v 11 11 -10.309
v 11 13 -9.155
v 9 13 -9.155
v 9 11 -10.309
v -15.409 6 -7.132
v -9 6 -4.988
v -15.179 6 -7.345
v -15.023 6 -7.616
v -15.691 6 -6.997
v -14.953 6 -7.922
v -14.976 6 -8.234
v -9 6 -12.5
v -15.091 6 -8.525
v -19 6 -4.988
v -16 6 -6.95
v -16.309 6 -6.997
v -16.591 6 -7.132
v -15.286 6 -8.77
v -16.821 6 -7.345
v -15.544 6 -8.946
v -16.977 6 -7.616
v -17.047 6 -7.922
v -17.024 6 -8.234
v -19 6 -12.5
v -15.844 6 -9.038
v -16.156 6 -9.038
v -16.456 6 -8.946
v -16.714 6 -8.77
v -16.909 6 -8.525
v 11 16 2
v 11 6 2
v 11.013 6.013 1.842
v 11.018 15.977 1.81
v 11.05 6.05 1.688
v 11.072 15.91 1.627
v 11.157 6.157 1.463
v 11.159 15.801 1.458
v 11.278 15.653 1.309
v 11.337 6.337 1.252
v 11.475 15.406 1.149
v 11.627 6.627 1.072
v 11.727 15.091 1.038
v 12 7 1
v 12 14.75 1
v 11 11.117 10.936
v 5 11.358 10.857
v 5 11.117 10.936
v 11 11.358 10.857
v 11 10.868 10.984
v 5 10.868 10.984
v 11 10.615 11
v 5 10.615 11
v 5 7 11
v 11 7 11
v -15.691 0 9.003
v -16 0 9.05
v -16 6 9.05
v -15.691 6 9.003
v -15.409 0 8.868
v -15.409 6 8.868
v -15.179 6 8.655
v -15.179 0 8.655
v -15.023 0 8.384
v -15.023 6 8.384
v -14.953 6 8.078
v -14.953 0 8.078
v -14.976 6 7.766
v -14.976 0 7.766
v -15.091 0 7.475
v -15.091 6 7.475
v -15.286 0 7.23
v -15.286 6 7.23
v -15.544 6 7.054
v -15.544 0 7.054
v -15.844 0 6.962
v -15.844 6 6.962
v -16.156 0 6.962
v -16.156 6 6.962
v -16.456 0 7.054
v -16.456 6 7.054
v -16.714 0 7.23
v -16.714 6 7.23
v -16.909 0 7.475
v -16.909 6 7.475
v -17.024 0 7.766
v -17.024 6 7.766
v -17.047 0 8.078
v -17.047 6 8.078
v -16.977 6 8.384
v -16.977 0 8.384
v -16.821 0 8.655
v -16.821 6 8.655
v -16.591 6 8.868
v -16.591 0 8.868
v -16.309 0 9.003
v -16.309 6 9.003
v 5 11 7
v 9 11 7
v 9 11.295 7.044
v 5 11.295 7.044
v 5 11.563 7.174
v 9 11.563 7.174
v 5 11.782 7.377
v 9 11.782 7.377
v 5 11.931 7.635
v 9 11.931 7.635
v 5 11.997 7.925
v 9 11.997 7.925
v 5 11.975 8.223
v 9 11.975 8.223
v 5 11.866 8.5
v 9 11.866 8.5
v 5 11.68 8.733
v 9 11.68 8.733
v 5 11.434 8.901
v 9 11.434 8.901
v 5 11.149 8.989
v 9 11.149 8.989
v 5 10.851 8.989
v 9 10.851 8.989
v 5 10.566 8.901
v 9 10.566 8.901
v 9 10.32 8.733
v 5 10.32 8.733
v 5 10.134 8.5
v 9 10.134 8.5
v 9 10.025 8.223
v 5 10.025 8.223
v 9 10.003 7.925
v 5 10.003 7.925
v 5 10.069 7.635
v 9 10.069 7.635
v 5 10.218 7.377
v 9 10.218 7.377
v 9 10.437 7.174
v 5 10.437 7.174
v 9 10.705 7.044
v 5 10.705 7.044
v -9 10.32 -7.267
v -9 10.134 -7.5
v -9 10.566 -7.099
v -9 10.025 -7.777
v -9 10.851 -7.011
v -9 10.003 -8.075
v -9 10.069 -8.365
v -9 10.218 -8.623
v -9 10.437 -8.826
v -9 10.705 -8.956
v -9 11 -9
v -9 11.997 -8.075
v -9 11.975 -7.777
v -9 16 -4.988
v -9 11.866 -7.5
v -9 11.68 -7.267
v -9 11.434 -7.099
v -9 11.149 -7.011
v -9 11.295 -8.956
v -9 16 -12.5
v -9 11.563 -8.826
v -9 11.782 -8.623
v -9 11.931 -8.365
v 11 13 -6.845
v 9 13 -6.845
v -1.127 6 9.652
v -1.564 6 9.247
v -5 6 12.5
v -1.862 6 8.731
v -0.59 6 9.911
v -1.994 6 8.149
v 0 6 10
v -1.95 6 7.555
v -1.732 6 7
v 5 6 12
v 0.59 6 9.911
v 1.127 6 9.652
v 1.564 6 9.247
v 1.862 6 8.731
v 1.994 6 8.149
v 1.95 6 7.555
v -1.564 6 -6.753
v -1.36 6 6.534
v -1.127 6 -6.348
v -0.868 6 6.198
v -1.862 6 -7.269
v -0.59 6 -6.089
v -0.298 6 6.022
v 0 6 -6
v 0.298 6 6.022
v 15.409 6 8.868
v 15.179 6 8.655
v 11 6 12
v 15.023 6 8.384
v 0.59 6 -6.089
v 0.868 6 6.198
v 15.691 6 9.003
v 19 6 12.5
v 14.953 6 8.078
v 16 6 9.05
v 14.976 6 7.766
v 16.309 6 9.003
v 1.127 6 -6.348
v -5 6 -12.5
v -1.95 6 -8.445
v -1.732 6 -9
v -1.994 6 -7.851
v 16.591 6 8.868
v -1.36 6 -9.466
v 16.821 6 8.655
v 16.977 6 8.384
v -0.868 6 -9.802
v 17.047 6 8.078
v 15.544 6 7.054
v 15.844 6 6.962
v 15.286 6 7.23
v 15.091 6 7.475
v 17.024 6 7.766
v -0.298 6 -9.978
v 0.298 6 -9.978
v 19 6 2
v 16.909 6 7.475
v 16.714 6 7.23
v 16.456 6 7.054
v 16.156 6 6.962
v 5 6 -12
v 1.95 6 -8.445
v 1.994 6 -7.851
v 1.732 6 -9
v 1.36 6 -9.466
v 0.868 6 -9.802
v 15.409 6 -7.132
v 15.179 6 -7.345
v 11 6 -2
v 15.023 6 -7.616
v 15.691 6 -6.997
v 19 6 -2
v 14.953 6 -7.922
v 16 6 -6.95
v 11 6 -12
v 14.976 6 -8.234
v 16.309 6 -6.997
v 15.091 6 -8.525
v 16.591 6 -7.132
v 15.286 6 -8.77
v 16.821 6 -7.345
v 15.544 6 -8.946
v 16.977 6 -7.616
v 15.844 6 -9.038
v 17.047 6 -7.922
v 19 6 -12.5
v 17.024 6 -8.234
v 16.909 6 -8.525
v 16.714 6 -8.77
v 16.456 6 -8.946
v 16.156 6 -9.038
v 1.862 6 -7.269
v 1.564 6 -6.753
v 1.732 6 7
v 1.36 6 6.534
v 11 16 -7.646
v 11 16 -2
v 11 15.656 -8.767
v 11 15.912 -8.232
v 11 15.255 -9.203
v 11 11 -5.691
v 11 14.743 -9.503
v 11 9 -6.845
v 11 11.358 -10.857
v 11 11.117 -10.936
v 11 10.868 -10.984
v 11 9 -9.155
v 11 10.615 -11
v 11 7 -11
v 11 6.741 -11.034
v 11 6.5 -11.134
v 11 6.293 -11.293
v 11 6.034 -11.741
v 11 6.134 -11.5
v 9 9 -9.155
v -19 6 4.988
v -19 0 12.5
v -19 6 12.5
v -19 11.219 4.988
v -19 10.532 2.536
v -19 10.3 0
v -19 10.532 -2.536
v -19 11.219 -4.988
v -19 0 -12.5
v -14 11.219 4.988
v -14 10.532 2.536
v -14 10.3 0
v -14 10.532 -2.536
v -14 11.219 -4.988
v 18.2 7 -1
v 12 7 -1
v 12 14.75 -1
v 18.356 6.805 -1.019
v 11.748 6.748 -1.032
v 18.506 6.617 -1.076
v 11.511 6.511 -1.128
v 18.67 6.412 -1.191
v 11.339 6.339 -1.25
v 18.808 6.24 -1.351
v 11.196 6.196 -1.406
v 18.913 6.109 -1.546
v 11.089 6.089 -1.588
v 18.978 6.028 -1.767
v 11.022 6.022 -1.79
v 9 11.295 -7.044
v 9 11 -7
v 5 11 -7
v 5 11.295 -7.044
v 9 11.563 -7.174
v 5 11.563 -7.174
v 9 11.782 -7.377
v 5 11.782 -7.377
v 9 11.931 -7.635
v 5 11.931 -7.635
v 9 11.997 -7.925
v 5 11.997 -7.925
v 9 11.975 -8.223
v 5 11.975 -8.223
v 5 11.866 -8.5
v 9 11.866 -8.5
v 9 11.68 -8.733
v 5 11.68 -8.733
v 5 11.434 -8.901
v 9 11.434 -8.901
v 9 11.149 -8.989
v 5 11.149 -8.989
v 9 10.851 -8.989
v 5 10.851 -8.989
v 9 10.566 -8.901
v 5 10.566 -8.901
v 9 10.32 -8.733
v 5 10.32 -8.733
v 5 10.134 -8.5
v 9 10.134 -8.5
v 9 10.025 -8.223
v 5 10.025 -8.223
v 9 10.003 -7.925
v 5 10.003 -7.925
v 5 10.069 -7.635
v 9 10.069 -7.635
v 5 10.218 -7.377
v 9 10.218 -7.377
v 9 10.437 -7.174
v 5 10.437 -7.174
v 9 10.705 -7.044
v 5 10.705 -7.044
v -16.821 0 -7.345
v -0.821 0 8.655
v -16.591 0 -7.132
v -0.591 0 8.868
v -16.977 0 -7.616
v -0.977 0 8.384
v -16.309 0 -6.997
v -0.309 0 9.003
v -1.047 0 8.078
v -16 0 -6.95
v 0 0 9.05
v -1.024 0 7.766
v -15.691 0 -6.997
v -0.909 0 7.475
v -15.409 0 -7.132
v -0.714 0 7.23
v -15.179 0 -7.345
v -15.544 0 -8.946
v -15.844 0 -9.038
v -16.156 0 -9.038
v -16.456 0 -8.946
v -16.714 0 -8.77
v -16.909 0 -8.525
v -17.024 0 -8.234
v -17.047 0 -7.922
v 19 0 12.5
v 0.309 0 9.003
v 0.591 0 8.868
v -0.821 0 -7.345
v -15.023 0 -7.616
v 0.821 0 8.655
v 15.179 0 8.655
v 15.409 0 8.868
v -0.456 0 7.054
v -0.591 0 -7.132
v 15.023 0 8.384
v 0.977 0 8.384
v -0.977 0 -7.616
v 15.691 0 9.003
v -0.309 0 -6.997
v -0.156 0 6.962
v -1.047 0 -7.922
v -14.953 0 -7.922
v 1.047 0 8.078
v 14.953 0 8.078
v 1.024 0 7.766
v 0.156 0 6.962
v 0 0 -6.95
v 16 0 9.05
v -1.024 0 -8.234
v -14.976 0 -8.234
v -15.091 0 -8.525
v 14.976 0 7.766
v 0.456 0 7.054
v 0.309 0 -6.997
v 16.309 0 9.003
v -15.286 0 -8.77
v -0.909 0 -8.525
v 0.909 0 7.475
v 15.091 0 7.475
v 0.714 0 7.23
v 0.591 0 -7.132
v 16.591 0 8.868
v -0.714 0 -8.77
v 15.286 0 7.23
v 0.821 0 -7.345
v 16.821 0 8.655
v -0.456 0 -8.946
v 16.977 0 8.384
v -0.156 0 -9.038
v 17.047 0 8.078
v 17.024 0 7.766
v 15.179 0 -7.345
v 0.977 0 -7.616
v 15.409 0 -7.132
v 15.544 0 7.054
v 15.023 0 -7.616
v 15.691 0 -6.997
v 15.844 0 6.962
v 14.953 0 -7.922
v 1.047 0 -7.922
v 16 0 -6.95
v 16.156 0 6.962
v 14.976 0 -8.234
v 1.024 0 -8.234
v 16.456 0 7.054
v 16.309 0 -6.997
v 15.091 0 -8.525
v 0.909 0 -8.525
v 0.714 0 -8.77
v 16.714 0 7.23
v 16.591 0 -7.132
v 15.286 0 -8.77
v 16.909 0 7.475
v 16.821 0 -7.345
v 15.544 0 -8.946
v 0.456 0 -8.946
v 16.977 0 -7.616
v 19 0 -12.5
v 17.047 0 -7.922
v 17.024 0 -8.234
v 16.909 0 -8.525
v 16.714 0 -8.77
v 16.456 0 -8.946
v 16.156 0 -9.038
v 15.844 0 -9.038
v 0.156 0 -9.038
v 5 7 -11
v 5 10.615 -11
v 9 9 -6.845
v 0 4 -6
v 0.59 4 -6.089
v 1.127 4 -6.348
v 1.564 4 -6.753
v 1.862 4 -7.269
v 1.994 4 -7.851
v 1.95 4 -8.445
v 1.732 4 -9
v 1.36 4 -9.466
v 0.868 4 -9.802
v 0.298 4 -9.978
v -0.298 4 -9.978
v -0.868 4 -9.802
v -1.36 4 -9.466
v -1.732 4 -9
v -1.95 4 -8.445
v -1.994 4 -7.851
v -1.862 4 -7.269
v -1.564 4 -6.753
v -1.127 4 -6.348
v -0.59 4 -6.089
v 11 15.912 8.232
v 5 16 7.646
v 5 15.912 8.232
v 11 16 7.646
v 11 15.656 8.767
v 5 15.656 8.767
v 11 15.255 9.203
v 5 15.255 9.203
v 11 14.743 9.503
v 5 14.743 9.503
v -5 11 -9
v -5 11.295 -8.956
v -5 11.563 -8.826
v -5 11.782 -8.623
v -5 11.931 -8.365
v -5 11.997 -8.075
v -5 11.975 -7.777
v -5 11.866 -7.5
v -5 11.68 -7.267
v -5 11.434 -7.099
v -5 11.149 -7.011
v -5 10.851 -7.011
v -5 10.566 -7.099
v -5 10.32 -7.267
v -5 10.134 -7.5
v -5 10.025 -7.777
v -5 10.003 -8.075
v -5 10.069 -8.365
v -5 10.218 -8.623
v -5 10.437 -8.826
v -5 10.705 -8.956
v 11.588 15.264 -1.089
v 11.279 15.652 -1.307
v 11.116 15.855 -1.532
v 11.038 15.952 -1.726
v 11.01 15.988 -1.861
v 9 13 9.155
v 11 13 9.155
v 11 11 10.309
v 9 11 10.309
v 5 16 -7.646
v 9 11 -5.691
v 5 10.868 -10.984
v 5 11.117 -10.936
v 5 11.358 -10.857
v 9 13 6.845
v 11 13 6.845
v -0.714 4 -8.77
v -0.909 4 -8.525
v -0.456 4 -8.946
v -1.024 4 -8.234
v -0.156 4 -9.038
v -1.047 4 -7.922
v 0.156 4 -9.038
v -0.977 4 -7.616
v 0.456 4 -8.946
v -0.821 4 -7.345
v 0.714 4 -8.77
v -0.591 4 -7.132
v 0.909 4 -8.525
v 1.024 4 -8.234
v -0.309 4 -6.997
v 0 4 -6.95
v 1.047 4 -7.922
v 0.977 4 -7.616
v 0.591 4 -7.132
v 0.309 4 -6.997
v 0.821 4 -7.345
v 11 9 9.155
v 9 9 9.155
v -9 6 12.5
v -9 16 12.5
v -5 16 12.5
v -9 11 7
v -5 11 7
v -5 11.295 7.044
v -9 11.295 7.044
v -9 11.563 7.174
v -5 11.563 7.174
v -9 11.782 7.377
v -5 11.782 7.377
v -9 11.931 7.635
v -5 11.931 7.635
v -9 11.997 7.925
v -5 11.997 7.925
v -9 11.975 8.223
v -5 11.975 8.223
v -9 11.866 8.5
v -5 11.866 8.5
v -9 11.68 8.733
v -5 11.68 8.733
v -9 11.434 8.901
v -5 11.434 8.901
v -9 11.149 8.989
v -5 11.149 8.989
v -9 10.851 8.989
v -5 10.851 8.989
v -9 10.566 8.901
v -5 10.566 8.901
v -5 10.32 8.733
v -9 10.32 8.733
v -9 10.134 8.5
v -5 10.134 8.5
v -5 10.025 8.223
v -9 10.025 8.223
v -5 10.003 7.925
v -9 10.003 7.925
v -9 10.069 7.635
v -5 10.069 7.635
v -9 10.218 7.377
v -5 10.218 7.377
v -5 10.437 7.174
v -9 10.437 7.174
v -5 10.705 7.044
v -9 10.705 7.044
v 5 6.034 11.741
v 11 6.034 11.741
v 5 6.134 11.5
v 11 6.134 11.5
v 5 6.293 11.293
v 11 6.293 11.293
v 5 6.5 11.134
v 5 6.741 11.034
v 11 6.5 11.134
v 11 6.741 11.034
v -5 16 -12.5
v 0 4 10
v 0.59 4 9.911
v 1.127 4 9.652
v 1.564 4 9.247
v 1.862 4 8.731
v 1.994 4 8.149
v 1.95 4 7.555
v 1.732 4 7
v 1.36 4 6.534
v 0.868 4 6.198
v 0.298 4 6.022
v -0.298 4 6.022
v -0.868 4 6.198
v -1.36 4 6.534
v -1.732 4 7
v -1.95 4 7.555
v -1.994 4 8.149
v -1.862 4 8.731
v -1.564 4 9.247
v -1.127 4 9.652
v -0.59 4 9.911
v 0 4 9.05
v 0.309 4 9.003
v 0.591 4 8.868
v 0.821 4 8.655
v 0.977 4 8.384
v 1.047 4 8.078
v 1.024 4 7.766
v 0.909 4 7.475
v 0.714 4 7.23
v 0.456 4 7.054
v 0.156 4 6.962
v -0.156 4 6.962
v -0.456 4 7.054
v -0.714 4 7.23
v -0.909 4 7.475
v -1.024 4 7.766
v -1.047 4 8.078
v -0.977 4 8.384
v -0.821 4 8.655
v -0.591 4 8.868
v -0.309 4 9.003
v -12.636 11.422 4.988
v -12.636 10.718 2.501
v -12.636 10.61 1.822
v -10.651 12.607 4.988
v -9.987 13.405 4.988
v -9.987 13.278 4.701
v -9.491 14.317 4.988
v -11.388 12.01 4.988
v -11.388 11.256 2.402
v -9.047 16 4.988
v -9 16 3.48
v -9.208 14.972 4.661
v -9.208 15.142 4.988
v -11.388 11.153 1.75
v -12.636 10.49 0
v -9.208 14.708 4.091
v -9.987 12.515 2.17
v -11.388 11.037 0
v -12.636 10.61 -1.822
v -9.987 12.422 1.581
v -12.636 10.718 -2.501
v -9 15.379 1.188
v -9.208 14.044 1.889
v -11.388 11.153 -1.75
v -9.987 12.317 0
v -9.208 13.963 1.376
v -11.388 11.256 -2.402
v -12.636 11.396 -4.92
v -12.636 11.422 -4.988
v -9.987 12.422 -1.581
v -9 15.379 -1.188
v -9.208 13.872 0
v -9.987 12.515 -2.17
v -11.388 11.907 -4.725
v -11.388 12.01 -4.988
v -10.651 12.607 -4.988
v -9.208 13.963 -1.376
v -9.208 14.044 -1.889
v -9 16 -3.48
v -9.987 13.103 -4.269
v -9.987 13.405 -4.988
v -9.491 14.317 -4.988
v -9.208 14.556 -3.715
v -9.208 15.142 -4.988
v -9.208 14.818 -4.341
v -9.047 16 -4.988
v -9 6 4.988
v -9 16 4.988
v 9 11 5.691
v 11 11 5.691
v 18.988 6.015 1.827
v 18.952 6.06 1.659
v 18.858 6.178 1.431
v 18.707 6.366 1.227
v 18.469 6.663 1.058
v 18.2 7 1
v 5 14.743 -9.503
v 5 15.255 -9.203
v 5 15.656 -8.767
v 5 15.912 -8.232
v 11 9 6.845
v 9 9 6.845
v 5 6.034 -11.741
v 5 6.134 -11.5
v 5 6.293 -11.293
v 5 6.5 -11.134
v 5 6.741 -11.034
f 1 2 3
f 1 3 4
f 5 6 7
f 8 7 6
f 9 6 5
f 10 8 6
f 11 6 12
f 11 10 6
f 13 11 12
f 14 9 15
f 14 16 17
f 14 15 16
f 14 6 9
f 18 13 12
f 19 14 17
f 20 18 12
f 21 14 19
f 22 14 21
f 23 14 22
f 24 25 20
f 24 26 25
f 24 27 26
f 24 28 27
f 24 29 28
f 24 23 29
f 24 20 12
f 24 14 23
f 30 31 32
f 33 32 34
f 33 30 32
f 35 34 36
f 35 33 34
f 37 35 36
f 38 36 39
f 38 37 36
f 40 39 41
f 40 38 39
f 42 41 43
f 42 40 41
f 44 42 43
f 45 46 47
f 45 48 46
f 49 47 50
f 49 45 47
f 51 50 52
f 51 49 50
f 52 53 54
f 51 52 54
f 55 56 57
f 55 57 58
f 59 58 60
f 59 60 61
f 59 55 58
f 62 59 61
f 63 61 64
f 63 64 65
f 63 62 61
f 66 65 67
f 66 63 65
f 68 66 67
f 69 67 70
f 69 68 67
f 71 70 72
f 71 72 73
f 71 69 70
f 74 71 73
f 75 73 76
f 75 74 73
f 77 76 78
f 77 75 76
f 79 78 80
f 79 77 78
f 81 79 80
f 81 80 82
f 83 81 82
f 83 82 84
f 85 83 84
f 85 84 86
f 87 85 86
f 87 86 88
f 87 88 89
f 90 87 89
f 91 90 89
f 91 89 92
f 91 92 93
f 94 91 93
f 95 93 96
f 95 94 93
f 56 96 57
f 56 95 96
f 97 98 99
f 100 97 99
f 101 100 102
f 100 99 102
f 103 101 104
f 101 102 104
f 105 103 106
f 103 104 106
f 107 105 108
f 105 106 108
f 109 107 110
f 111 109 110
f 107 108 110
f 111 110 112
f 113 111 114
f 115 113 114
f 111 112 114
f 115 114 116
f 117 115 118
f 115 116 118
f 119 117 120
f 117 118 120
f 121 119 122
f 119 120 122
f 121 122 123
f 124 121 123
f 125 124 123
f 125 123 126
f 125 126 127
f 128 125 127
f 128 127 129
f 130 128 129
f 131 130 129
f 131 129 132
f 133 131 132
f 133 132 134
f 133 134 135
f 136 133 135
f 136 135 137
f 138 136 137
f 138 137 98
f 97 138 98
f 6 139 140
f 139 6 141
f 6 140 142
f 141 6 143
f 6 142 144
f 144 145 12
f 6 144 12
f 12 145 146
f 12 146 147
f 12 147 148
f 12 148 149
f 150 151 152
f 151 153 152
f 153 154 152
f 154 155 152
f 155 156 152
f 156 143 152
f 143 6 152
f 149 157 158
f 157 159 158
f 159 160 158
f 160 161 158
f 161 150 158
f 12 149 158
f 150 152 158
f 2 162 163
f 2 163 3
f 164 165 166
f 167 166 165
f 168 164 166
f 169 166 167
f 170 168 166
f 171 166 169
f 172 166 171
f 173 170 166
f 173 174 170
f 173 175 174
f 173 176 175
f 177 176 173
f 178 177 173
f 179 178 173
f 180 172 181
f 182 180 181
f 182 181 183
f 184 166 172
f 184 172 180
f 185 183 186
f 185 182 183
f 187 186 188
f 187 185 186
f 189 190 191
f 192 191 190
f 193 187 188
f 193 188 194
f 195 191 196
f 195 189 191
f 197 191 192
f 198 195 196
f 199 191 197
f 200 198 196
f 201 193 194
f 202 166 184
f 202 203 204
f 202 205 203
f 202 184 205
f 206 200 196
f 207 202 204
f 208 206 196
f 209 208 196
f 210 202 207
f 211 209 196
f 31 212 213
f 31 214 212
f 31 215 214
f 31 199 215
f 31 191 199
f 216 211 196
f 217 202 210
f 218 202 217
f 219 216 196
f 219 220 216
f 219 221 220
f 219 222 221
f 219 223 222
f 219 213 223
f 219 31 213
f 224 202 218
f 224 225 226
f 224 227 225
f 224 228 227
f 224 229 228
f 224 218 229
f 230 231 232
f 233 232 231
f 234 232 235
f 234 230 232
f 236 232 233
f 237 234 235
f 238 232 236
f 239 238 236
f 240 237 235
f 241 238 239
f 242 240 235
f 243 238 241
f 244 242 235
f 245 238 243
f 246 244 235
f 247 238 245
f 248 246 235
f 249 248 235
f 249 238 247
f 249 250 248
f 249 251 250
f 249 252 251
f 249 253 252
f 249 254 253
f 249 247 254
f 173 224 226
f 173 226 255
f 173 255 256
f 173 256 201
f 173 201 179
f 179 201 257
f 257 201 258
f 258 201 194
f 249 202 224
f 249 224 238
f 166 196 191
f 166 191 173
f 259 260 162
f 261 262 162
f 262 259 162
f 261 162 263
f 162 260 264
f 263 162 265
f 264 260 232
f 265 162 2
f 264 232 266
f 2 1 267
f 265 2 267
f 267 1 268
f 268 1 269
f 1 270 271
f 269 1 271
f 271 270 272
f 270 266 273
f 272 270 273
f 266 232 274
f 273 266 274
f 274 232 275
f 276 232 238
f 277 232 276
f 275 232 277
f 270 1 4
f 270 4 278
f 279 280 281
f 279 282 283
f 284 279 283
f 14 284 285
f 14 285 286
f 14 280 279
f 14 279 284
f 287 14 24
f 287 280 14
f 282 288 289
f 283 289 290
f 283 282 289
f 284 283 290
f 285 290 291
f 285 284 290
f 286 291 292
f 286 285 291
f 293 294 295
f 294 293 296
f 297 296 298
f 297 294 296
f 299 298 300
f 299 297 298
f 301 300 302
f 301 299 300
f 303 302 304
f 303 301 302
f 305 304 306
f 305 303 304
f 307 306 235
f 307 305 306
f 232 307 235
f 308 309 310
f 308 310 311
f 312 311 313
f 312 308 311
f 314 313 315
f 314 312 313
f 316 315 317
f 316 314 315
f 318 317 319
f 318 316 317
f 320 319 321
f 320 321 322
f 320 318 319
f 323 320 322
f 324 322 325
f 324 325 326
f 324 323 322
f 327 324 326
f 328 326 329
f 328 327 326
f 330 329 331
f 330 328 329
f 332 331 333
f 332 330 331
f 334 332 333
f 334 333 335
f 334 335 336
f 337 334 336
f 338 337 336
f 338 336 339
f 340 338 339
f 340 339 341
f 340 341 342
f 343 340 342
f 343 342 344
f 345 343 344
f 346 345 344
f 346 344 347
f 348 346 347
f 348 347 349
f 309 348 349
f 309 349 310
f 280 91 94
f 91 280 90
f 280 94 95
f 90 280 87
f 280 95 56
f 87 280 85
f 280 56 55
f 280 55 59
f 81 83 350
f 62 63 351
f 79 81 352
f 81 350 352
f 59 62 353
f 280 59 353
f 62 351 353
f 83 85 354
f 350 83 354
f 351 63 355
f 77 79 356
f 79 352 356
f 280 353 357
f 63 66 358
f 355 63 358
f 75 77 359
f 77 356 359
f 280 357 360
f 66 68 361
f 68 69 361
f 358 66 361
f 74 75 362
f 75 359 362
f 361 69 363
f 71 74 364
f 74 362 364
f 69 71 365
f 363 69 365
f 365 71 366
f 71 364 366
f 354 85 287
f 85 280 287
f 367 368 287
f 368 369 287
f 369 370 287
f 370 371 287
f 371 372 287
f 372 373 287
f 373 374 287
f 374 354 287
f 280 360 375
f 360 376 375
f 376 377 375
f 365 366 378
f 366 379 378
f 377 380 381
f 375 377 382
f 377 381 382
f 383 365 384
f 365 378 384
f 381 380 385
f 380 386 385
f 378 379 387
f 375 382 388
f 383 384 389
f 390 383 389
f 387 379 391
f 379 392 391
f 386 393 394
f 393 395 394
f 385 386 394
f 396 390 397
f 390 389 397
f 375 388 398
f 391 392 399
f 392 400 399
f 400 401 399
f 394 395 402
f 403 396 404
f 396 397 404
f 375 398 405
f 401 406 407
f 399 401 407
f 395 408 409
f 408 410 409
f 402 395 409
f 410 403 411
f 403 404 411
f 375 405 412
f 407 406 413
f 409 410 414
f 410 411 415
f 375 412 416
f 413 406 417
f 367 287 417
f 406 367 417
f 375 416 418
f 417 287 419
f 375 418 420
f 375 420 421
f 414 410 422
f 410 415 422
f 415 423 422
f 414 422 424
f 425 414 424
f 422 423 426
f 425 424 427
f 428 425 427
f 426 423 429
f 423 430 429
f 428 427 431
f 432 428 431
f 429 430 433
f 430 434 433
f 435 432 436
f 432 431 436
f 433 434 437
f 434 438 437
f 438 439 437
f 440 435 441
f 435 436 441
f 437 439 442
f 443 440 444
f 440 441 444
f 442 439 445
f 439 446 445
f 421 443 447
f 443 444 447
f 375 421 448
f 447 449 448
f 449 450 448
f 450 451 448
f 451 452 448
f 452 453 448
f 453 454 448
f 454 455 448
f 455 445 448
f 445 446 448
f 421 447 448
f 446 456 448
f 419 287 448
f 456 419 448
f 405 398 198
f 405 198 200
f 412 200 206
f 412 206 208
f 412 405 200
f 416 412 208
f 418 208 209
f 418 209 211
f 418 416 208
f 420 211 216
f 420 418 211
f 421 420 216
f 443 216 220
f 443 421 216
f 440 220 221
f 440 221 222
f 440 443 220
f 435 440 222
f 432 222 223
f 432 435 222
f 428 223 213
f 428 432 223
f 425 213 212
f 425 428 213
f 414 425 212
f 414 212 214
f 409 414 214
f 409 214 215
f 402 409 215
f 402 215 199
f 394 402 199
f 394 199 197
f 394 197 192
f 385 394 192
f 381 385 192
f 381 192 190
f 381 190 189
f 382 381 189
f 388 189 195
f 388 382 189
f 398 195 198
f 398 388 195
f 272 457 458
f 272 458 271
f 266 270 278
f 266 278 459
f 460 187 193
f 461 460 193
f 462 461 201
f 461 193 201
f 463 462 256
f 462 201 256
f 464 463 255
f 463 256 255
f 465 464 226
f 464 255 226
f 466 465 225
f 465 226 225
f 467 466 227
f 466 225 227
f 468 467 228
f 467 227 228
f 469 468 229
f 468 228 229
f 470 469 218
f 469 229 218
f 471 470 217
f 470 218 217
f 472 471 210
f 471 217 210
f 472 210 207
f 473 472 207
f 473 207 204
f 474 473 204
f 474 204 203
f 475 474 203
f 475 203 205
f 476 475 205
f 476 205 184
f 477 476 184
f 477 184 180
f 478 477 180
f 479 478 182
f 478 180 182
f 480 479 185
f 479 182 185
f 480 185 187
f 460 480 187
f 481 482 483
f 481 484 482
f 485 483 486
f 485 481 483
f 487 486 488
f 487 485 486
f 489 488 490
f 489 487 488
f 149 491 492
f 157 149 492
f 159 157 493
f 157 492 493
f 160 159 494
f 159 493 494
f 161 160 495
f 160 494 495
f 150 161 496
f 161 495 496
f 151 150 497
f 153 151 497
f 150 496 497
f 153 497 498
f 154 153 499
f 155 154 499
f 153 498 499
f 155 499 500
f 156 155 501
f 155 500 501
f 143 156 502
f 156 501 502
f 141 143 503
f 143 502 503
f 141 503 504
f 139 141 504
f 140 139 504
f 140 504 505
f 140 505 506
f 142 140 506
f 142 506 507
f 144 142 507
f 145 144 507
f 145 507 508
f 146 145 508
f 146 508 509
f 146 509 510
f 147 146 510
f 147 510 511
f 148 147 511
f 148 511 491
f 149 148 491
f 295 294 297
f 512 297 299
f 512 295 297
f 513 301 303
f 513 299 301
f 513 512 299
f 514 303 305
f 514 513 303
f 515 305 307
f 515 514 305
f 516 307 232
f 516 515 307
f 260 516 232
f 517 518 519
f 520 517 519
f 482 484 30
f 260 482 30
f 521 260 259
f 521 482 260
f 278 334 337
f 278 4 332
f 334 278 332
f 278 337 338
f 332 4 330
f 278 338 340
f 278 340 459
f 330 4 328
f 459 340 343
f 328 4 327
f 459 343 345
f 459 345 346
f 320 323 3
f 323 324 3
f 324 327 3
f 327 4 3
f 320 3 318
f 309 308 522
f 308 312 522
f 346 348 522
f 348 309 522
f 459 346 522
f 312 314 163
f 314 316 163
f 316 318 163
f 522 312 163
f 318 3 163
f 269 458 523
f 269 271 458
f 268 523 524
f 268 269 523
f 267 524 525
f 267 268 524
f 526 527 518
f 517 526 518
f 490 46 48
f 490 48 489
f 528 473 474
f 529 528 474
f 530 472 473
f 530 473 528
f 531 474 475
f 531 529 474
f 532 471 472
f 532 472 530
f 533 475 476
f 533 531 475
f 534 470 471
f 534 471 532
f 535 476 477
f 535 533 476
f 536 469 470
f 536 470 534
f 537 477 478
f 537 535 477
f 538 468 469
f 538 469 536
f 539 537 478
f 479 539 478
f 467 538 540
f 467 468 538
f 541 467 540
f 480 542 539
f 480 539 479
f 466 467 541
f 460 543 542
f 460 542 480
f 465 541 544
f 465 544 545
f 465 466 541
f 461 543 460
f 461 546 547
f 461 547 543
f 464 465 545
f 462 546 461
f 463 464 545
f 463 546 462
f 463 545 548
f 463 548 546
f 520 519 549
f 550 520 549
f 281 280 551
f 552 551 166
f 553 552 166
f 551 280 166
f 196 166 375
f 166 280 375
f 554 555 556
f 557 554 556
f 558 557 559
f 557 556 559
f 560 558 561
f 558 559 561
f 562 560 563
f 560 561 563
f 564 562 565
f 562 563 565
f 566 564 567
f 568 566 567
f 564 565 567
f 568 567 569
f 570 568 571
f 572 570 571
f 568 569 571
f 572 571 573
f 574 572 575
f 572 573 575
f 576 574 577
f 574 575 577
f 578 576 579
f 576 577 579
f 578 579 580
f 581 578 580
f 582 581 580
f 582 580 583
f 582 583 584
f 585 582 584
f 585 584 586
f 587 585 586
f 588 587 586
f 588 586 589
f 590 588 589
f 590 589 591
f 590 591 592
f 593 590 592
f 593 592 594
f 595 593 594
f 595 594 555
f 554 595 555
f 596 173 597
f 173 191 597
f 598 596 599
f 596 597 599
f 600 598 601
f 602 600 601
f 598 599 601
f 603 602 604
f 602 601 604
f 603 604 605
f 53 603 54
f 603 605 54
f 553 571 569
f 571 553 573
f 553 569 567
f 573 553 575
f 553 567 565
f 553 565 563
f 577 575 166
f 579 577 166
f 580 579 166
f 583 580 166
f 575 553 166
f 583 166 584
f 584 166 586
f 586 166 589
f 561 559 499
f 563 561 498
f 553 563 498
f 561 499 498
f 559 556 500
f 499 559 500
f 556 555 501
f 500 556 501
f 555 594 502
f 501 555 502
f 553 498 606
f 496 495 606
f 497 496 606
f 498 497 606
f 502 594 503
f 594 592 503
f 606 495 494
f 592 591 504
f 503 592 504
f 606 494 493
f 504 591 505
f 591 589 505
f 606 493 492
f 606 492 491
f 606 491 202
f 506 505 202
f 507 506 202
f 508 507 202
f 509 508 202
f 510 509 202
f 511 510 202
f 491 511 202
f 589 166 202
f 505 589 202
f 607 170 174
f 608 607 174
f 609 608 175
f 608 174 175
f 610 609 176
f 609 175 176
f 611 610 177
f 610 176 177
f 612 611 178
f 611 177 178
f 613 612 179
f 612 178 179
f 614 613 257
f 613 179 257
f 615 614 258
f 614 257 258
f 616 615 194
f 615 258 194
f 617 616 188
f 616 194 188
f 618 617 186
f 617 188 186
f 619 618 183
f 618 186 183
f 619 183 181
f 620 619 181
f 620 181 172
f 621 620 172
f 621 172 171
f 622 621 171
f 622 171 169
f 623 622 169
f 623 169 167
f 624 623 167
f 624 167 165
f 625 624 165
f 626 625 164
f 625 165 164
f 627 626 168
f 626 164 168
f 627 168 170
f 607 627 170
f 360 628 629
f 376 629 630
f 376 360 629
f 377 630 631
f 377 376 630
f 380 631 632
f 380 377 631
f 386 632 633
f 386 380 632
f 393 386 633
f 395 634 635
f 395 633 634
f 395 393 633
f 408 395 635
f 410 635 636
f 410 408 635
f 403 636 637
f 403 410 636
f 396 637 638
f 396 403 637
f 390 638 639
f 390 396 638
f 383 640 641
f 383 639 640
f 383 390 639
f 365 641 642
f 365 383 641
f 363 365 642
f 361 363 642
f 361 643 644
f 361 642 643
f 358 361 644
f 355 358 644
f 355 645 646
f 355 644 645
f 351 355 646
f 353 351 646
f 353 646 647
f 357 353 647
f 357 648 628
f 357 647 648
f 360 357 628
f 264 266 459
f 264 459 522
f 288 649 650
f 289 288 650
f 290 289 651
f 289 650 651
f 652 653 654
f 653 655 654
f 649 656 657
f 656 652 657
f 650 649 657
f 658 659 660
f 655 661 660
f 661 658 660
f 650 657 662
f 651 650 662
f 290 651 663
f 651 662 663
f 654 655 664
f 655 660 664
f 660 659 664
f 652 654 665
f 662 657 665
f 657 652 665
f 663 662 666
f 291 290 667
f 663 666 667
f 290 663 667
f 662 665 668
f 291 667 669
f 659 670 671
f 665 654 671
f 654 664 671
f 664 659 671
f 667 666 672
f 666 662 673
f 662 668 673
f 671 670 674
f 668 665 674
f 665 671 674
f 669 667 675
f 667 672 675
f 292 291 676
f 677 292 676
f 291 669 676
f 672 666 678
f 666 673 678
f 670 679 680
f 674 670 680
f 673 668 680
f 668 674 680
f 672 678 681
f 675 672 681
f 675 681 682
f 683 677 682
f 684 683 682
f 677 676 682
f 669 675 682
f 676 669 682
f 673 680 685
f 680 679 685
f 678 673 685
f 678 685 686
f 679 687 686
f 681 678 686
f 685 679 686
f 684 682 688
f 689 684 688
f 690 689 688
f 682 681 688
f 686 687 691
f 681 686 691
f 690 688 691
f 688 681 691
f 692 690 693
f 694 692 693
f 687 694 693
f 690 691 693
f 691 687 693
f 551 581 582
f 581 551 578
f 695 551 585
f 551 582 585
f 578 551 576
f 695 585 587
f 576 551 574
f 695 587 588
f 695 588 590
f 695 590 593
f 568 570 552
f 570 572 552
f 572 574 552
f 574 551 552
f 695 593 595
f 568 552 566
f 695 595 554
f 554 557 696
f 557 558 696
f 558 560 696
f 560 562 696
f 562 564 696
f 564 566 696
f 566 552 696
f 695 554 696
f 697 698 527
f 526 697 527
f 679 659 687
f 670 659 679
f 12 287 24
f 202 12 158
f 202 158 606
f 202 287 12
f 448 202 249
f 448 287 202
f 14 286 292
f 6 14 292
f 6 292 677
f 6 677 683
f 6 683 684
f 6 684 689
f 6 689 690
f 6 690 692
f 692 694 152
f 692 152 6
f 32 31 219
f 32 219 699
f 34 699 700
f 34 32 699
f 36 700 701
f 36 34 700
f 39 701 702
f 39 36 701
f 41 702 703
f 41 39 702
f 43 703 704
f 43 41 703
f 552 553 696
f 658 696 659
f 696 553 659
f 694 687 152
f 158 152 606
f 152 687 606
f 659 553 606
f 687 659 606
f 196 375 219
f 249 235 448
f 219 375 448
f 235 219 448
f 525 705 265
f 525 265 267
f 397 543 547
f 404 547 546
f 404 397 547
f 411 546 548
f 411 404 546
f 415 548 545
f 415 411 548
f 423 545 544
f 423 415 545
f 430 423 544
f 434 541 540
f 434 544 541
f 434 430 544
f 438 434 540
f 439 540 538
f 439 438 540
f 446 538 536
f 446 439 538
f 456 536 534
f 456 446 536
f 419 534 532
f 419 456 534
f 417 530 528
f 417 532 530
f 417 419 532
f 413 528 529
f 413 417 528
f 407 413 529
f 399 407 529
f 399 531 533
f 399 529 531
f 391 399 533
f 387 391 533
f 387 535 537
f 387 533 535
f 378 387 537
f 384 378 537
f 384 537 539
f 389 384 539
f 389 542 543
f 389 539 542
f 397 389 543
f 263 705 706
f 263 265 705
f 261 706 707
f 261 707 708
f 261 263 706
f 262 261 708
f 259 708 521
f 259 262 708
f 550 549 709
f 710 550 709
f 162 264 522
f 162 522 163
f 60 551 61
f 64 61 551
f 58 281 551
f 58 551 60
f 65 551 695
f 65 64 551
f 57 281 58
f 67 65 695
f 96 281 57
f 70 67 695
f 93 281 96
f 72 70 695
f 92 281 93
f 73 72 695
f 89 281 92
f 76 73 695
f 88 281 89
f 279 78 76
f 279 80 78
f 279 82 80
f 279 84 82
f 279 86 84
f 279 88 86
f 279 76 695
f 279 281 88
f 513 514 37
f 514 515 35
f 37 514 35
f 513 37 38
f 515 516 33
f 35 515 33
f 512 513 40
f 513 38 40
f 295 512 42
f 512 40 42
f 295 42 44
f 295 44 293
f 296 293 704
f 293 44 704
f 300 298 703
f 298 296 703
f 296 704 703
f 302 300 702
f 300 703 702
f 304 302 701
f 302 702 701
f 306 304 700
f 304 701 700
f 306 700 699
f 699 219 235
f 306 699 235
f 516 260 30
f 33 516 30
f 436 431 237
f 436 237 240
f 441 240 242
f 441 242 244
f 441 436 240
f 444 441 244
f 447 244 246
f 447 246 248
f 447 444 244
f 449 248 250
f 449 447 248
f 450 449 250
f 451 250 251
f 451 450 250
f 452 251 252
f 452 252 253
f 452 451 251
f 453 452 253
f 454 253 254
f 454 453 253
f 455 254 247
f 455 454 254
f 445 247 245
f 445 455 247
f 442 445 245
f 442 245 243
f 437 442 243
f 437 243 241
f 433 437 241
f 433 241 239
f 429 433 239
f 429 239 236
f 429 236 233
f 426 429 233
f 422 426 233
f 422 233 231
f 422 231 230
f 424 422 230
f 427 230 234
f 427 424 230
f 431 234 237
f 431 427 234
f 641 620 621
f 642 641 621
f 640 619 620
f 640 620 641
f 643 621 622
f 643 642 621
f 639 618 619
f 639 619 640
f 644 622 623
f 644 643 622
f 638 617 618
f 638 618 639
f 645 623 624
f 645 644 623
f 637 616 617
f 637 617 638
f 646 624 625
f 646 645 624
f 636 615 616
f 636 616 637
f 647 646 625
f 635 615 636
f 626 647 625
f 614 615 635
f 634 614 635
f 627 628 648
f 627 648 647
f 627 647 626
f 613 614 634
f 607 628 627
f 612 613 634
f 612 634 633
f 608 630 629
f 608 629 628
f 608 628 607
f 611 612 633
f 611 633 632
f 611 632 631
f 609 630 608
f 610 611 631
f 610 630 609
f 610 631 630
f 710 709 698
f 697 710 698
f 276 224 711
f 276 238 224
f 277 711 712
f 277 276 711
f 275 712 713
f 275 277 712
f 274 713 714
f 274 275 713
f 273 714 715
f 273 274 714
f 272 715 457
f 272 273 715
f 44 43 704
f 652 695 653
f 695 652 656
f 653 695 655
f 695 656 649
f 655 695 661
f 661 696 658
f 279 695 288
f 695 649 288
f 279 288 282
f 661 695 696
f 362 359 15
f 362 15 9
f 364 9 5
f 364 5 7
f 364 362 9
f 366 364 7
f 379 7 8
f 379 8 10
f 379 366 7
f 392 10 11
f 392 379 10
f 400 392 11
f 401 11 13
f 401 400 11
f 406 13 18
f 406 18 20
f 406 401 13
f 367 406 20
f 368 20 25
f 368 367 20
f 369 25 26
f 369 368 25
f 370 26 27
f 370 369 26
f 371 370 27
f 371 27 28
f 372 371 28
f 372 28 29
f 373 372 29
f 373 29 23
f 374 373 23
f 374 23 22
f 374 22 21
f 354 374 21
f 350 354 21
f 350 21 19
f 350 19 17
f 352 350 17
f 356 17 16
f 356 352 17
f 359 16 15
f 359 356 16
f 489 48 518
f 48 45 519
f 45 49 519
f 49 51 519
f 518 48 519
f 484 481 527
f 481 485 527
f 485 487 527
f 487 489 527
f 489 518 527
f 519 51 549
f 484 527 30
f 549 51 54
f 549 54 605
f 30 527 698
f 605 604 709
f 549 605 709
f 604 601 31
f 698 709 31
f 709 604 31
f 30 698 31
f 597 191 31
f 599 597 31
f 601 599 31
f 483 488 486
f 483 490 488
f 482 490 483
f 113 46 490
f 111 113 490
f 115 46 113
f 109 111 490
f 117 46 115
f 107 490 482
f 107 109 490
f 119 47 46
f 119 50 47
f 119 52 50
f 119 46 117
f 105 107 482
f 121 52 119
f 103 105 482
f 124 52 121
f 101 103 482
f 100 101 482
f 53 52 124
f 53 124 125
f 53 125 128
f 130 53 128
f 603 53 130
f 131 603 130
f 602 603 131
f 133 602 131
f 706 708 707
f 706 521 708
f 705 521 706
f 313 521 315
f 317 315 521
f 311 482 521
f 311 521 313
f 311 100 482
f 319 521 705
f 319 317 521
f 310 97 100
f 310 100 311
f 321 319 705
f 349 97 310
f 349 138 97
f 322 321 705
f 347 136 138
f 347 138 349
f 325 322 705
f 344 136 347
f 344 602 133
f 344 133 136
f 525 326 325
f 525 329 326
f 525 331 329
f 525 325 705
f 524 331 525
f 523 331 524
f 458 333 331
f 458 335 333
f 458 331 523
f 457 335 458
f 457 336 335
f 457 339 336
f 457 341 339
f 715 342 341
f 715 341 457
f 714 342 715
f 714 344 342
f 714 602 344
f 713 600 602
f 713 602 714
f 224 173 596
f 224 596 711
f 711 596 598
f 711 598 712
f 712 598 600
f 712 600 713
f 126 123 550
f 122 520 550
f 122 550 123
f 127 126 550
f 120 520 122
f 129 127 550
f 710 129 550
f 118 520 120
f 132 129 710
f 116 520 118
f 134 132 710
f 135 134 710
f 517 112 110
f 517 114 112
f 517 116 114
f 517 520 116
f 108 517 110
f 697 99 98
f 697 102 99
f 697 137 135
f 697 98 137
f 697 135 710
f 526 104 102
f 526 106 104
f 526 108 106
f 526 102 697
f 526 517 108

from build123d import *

# Parameters (mm, degrees)
SKETCH1_R           = 1.05
BOSS_EXTRUDE1_DEPTH = 6
SKETCH2_W           = 14
SKETCH2_H           = 25
SKETCH2_W_2         = 6
SKETCH2_H_2         = 22
BOSS_EXTRUDE2_DEPTH = 10
FILLET1_R           = 1
CUT_EXTRUDE2_START  = -6
CUT_EXTRUDE2_DEPTH  = 6
FILLET2_R           = 2
CUT_EXTRUDE3_DEPTH  = 2
CUT_EXTRUDE4_REACH  = 36.587
SKETCH9_R           = 1
BOSS_EXTRUDE3_DEPTH = 1
FILLET3_R           = 1
SKETCH13_R          = 2
CUT_EXTRUDE5_DEPTH  = 2
CUT_EXTRUDE6_DEPTH  = 10
SKETCH15_R          = 1
CUT_EXTRUDE7_DEPTH  = 32.436443819
FILLET4_R           = 5


with BuildPart() as part:
    # Sketch1 → Boss-Extrude1 (new body)
    with BuildSketch(Plane(origin=(0, 0, 0), x_dir=(1, 0, 0), z_dir=(0, 1, 0))):
        Polygon((19, -4.5), (19, 5), (19, 12.5), (-19, 12.5), (-19, 5), (-19, -4.5), (-19, -5), (-19, -12.5), (19, -12.5), (19, -5), align=None)
        with Locations(Location((16, -8, 0), (0, 0, 270))):
            Circle(SKETCH1_R, mode=Mode.SUBTRACT)
        with Locations(Location((0, -8, 0), (0, 0, 270))):
            Circle(SKETCH1_R, mode=Mode.SUBTRACT)
        with Locations(Location((16, 8, 0), (0, 0, 270))):
            Circle(SKETCH1_R, mode=Mode.SUBTRACT)
        with Locations(Location((0, 8, 0), (0, 0, 270))):
            Circle(SKETCH1_R, mode=Mode.SUBTRACT)
        with Locations(Location((-16, -8, 0), (0, 0, 270))):
            Circle(SKETCH1_R, mode=Mode.SUBTRACT)
        with Locations(Location((-16, 8, 0), (0, 0, 270))):
            Circle(SKETCH1_R, mode=Mode.SUBTRACT)
    extrude(amount=BOSS_EXTRUDE1_DEPTH)

    # Sketch2 → Boss-Extrude2 (add)
    with BuildSketch(Plane(origin=(0, 6, 0), x_dir=(1, 0, 0), z_dir=(0, 1, 0))):
        with Locations((-12, 0)):
            Rectangle(SKETCH2_W, SKETCH2_H)
        with Locations((8, 0)):
            Rectangle(SKETCH2_W_2, SKETCH2_H_2)
    extrude(amount=BOSS_EXTRUDE2_DEPTH)

    # Fillet1
    fillet1_edges = [part.edges().sort_by_distance(p)[0] for p in [
        (8, 6, -11),
        (8, 6, 11),
    ]]
    fillet(fillet1_edges, radius=FILLET1_R)

    # Sketch7 → Cut-Extrude2 (cut)
    with BuildSketch(Plane(origin=(11, 0, 0), x_dir=(0, 0, -1), z_dir=(1, 0, 0)).offset(CUT_EXTRUDE2_START)):
        Polygon((-11, 11), (-9, 16), (9, 16), (11, 11), (15.487403983, 11), (15.487403983, 19.998448993), (-12.222391387, 19.998448993), (-12.222391387, 11), align=None)
    extrude(amount=CUT_EXTRUDE2_DEPTH, mode=Mode.SUBTRACT)

    # Fillet2
    fillet2_edges = [part.edges().sort_by_distance(p)[0] for p in [
        (8, 11, 11),
        (8, 16, 9),
        (8, 16, -9),
        (8, 11, -11),
    ]]
    fillet(fillet2_edges, radius=FILLET2_R)

    # Sketch8 → Cut-Extrude3 (cut)
    with BuildSketch(Plane(origin=(11, 0, 0), x_dir=(0, 0, -1), z_dir=(1, 0, 0))):
        Polygon((-5.690598923, 11), (-6.845299462, 13), (-9.154700538, 13), (-10.309401077, 11), (-9.154700538, 9), (-6.845299462, 9), align=None)
    cut_extrude3 = extrude(amount=-CUT_EXTRUDE3_DEPTH, mode=Mode.SUBTRACT)

    # Sketch9 → Cut-Extrude4 (cut, up to next)
    with BuildSketch(Plane(origin=(9, 0, 0), x_dir=(0, 0, -1), z_dir=(1, 0, 0)), mode=Mode.PRIVATE) as cut_extrude4_sk1:
        with Locations((-8, 11)):
            Circle(SKETCH9_R)
    cut_extrude4_tool1 = extrude(cut_extrude4_sk1.sketch, amount=-CUT_EXTRUDE4_REACH, mode=Mode.PRIVATE) & part.part
    cut_extrude4 = cut_extrude4_tool1.solids().sort_by_distance((9, 11, 8))[0]
    add(cut_extrude4, mode=Mode.SUBTRACT)

    # Mirror1: Cut-Extrude3, Cut-Extrude4 across plane
    add(cut_extrude3.mirror(Plane.XY), mode=Mode.SUBTRACT)
    add(cut_extrude4.mirror(Plane.XY), mode=Mode.SUBTRACT)

    # Sketch11 → Boss-Extrude3 (add, symmetric)
    with BuildSketch(Plane.XY):
        Polygon((19, 6), (11, 16), (11, 6), align=None)
    extrude(amount=BOSS_EXTRUDE3_DEPTH, both=True)

    # Fillet3
    # the kernel refuses this fillet: 1 mm, written as the material it adds along each edge
    with BuildSketch(Plane(origin=(8.5, 6, 1), x_dir=(0, 1, 0), z_dir=(1, 0, 0))) as fillet3_piece_1_section:
        with BuildLine():
            CenterArc((FILLET3_R, FILLET3_R), FILLET3_R, 180, 90)
            Line((0, FILLET3_R), (0, 0))
            Line((0, 0), (FILLET3_R, 0))
        make_face()
    fillet3_piece_1 = extrude(amount=10.5, mode=Mode.PRIVATE)
    fillet3_piece_1 = split(fillet3_piece_1, bisect_by=Plane(origin=(15.279807261, 10.650240923, 1.226395114), z_dir=(-0.7808688094430304, -0.6246950475544243, 0)), keep=Keep.TOP, mode=Mode.PRIVATE)
    add(fillet3_piece_1)
    with BuildSketch(Plane(origin=(11, 16, 1), x_dir=(0, 0, 1), z_dir=(0, -1, 0))) as fillet3_piece_2_section:
        with BuildLine():
            CenterArc((FILLET3_R, -FILLET3_R), FILLET3_R, 90, 90)
            Line((0, -FILLET3_R), (0, 0))
            Line((0, 0), (FILLET3_R, 0))
        make_face()
    fillet3_piece_2 = extrude(amount=12.5, mode=Mode.PRIVATE)
    fillet3_piece_2 = split(fillet3_piece_2, bisect_by=Plane(origin=(13.592508379, 12.759364526, 1.22990039), z_dir=(-0.7808688094430304, -0.6246950475544243, 0)), keep=Keep.TOP, mode=Mode.PRIVATE)
    add(fillet3_piece_2)
    with BuildSketch(Plane(origin=(8.5, 6, -1), x_dir=(0, 0, -1), z_dir=(1, 0, 0))) as fillet3_piece_3_section:
        with BuildLine():
            CenterArc((FILLET3_R, FILLET3_R), FILLET3_R, 180, 90)
            Line((0, FILLET3_R), (0, 0))
            Line((0, 0), (FILLET3_R, 0))
        make_face()
    fillet3_piece_3 = extrude(amount=10.5, mode=Mode.PRIVATE)
    fillet3_piece_3 = split(fillet3_piece_3, bisect_by=Plane(origin=(15.279807261, 10.650240923, -1.226395114), z_dir=(-0.7808688094430304, -0.6246950475544243, 0)), keep=Keep.TOP, mode=Mode.PRIVATE)
    add(fillet3_piece_3)
    with BuildSketch(Plane(origin=(11, 16, -1), x_dir=(0, 0, -1), z_dir=(0, -1, 0))) as fillet3_piece_4_section:
        with BuildLine():
            CenterArc((FILLET3_R, FILLET3_R), FILLET3_R, 180, 90)
            Line((0, FILLET3_R), (0, 0))
            Line((0, 0), (FILLET3_R, 0))
        make_face()
    fillet3_piece_4 = extrude(amount=12.5, mode=Mode.PRIVATE)
    fillet3_piece_4 = split(fillet3_piece_4, bisect_by=Plane(origin=(13.592508379, 12.759364526, -1.22990039), z_dir=(-0.7808688094430304, -0.6246950475544243, 0)), keep=Keep.TOP, mode=Mode.PRIVATE)
    add(fillet3_piece_4)

    # Sketch13 → Cut-Extrude5 (cut)
    with BuildSketch(Plane(origin=(0, 6, 0), x_dir=(1, 0, 0), z_dir=(0, 1, 0))):
        with Locations(Location((0, -8, 0), (0, 0, 270))):
            Circle(SKETCH13_R)
        with Locations(Location((0, 8, 0), (0, 0, 270))):
            Circle(SKETCH13_R)
    extrude(amount=-CUT_EXTRUDE5_DEPTH, mode=Mode.SUBTRACT)

    # Sketch14 → Cut-Extrude6 (cut)
    with BuildSketch(Plane.ZY.offset(19)):
        with BuildLine():
            Line((-4.987800212, 11.218644984), (-4.987800212, 6))
            Line((-4.987800212, 6), (-16.528108282, 6))
            Line((-16.528108282, 6), (-16.528108282, 44.040536724))
            Line((-16.528108282, 44.040536724), (16.528108282, 44.040536724))
            Line((16.528108282, 44.040536724), (16.528108282, 6))
            Line((16.528108282, 6), (4.987800212, 6))
            Line((4.987800212, 6), (4.987800212, 11.218644984))
            ThreePointArc((4.987800212, 11.218644984), (0, 10.3), (-4.987800212, 11.218644984))
        make_face()
    extrude(amount=-CUT_EXTRUDE6_DEPTH, mode=Mode.SUBTRACT)

    # Sketch15 → Cut-Extrude7 (cut, through all)
    with BuildSketch(Plane(origin=(-5, 0, 0), x_dir=(0, 0, -1), z_dir=(1, 0, 0))):
        with Locations((-8, 11)):
            Circle(SKETCH15_R)
        with Locations((8, 11)):
            Circle(SKETCH15_R)
    extrude(amount=-CUT_EXTRUDE7_DEPTH, mode=Mode.SUBTRACT)

    # Fillet4
    # the kernel refuses this fillet: 5 mm, written as the material it adds along each edge
    with BuildSketch(Plane(origin=(-9, 24.3, 0), x_dir=(0, -0.30847325638563394, 0.9512330156669516), z_dir=(0, 0.9512330156669516, 0.30847325638563394))) as fillet4_piece_1_section:
        with BuildLine():
            CenterArc((14 - FILLET4_R, -FILLET4_R), FILLET4_R, 0, 90)
            Line((14, -FILLET4_R), (14, 0))
            Line((14, 0), (14 - FILLET4_R, 0))
        make_face()
    fillet4_piece_1 = revolve(axis=Axis((-9, 24.3, 0), (1, 0, 0)), revolution_arc=144.065508201, mode=Mode.PRIVATE)
    fillet4_piece_1 = split(fillet4_piece_1, bisect_by=Plane(origin=(-10.130683899, 16, -3.44e-07), z_dir=(0, -1, 0)), keep=Keep.TOP, mode=Mode.PRIVATE)
    fillet4_piece_1 = split(fillet4_piece_1, bisect_by=Plane(origin=(-10.130683899, 11.770838436, 4.987800212), z_dir=(0, 0, -1)), keep=Keep.TOP, mode=Mode.PRIVATE)
    fillet4_piece_1 = split(fillet4_piece_1, bisect_by=Plane(origin=(-10.130683899, 11.770838436, -4.987800212), z_dir=(0, 0, 1)), keep=Keep.TOP, mode=Mode.PRIVATE)
    add(fillet4_piece_1)


solid = part.part
